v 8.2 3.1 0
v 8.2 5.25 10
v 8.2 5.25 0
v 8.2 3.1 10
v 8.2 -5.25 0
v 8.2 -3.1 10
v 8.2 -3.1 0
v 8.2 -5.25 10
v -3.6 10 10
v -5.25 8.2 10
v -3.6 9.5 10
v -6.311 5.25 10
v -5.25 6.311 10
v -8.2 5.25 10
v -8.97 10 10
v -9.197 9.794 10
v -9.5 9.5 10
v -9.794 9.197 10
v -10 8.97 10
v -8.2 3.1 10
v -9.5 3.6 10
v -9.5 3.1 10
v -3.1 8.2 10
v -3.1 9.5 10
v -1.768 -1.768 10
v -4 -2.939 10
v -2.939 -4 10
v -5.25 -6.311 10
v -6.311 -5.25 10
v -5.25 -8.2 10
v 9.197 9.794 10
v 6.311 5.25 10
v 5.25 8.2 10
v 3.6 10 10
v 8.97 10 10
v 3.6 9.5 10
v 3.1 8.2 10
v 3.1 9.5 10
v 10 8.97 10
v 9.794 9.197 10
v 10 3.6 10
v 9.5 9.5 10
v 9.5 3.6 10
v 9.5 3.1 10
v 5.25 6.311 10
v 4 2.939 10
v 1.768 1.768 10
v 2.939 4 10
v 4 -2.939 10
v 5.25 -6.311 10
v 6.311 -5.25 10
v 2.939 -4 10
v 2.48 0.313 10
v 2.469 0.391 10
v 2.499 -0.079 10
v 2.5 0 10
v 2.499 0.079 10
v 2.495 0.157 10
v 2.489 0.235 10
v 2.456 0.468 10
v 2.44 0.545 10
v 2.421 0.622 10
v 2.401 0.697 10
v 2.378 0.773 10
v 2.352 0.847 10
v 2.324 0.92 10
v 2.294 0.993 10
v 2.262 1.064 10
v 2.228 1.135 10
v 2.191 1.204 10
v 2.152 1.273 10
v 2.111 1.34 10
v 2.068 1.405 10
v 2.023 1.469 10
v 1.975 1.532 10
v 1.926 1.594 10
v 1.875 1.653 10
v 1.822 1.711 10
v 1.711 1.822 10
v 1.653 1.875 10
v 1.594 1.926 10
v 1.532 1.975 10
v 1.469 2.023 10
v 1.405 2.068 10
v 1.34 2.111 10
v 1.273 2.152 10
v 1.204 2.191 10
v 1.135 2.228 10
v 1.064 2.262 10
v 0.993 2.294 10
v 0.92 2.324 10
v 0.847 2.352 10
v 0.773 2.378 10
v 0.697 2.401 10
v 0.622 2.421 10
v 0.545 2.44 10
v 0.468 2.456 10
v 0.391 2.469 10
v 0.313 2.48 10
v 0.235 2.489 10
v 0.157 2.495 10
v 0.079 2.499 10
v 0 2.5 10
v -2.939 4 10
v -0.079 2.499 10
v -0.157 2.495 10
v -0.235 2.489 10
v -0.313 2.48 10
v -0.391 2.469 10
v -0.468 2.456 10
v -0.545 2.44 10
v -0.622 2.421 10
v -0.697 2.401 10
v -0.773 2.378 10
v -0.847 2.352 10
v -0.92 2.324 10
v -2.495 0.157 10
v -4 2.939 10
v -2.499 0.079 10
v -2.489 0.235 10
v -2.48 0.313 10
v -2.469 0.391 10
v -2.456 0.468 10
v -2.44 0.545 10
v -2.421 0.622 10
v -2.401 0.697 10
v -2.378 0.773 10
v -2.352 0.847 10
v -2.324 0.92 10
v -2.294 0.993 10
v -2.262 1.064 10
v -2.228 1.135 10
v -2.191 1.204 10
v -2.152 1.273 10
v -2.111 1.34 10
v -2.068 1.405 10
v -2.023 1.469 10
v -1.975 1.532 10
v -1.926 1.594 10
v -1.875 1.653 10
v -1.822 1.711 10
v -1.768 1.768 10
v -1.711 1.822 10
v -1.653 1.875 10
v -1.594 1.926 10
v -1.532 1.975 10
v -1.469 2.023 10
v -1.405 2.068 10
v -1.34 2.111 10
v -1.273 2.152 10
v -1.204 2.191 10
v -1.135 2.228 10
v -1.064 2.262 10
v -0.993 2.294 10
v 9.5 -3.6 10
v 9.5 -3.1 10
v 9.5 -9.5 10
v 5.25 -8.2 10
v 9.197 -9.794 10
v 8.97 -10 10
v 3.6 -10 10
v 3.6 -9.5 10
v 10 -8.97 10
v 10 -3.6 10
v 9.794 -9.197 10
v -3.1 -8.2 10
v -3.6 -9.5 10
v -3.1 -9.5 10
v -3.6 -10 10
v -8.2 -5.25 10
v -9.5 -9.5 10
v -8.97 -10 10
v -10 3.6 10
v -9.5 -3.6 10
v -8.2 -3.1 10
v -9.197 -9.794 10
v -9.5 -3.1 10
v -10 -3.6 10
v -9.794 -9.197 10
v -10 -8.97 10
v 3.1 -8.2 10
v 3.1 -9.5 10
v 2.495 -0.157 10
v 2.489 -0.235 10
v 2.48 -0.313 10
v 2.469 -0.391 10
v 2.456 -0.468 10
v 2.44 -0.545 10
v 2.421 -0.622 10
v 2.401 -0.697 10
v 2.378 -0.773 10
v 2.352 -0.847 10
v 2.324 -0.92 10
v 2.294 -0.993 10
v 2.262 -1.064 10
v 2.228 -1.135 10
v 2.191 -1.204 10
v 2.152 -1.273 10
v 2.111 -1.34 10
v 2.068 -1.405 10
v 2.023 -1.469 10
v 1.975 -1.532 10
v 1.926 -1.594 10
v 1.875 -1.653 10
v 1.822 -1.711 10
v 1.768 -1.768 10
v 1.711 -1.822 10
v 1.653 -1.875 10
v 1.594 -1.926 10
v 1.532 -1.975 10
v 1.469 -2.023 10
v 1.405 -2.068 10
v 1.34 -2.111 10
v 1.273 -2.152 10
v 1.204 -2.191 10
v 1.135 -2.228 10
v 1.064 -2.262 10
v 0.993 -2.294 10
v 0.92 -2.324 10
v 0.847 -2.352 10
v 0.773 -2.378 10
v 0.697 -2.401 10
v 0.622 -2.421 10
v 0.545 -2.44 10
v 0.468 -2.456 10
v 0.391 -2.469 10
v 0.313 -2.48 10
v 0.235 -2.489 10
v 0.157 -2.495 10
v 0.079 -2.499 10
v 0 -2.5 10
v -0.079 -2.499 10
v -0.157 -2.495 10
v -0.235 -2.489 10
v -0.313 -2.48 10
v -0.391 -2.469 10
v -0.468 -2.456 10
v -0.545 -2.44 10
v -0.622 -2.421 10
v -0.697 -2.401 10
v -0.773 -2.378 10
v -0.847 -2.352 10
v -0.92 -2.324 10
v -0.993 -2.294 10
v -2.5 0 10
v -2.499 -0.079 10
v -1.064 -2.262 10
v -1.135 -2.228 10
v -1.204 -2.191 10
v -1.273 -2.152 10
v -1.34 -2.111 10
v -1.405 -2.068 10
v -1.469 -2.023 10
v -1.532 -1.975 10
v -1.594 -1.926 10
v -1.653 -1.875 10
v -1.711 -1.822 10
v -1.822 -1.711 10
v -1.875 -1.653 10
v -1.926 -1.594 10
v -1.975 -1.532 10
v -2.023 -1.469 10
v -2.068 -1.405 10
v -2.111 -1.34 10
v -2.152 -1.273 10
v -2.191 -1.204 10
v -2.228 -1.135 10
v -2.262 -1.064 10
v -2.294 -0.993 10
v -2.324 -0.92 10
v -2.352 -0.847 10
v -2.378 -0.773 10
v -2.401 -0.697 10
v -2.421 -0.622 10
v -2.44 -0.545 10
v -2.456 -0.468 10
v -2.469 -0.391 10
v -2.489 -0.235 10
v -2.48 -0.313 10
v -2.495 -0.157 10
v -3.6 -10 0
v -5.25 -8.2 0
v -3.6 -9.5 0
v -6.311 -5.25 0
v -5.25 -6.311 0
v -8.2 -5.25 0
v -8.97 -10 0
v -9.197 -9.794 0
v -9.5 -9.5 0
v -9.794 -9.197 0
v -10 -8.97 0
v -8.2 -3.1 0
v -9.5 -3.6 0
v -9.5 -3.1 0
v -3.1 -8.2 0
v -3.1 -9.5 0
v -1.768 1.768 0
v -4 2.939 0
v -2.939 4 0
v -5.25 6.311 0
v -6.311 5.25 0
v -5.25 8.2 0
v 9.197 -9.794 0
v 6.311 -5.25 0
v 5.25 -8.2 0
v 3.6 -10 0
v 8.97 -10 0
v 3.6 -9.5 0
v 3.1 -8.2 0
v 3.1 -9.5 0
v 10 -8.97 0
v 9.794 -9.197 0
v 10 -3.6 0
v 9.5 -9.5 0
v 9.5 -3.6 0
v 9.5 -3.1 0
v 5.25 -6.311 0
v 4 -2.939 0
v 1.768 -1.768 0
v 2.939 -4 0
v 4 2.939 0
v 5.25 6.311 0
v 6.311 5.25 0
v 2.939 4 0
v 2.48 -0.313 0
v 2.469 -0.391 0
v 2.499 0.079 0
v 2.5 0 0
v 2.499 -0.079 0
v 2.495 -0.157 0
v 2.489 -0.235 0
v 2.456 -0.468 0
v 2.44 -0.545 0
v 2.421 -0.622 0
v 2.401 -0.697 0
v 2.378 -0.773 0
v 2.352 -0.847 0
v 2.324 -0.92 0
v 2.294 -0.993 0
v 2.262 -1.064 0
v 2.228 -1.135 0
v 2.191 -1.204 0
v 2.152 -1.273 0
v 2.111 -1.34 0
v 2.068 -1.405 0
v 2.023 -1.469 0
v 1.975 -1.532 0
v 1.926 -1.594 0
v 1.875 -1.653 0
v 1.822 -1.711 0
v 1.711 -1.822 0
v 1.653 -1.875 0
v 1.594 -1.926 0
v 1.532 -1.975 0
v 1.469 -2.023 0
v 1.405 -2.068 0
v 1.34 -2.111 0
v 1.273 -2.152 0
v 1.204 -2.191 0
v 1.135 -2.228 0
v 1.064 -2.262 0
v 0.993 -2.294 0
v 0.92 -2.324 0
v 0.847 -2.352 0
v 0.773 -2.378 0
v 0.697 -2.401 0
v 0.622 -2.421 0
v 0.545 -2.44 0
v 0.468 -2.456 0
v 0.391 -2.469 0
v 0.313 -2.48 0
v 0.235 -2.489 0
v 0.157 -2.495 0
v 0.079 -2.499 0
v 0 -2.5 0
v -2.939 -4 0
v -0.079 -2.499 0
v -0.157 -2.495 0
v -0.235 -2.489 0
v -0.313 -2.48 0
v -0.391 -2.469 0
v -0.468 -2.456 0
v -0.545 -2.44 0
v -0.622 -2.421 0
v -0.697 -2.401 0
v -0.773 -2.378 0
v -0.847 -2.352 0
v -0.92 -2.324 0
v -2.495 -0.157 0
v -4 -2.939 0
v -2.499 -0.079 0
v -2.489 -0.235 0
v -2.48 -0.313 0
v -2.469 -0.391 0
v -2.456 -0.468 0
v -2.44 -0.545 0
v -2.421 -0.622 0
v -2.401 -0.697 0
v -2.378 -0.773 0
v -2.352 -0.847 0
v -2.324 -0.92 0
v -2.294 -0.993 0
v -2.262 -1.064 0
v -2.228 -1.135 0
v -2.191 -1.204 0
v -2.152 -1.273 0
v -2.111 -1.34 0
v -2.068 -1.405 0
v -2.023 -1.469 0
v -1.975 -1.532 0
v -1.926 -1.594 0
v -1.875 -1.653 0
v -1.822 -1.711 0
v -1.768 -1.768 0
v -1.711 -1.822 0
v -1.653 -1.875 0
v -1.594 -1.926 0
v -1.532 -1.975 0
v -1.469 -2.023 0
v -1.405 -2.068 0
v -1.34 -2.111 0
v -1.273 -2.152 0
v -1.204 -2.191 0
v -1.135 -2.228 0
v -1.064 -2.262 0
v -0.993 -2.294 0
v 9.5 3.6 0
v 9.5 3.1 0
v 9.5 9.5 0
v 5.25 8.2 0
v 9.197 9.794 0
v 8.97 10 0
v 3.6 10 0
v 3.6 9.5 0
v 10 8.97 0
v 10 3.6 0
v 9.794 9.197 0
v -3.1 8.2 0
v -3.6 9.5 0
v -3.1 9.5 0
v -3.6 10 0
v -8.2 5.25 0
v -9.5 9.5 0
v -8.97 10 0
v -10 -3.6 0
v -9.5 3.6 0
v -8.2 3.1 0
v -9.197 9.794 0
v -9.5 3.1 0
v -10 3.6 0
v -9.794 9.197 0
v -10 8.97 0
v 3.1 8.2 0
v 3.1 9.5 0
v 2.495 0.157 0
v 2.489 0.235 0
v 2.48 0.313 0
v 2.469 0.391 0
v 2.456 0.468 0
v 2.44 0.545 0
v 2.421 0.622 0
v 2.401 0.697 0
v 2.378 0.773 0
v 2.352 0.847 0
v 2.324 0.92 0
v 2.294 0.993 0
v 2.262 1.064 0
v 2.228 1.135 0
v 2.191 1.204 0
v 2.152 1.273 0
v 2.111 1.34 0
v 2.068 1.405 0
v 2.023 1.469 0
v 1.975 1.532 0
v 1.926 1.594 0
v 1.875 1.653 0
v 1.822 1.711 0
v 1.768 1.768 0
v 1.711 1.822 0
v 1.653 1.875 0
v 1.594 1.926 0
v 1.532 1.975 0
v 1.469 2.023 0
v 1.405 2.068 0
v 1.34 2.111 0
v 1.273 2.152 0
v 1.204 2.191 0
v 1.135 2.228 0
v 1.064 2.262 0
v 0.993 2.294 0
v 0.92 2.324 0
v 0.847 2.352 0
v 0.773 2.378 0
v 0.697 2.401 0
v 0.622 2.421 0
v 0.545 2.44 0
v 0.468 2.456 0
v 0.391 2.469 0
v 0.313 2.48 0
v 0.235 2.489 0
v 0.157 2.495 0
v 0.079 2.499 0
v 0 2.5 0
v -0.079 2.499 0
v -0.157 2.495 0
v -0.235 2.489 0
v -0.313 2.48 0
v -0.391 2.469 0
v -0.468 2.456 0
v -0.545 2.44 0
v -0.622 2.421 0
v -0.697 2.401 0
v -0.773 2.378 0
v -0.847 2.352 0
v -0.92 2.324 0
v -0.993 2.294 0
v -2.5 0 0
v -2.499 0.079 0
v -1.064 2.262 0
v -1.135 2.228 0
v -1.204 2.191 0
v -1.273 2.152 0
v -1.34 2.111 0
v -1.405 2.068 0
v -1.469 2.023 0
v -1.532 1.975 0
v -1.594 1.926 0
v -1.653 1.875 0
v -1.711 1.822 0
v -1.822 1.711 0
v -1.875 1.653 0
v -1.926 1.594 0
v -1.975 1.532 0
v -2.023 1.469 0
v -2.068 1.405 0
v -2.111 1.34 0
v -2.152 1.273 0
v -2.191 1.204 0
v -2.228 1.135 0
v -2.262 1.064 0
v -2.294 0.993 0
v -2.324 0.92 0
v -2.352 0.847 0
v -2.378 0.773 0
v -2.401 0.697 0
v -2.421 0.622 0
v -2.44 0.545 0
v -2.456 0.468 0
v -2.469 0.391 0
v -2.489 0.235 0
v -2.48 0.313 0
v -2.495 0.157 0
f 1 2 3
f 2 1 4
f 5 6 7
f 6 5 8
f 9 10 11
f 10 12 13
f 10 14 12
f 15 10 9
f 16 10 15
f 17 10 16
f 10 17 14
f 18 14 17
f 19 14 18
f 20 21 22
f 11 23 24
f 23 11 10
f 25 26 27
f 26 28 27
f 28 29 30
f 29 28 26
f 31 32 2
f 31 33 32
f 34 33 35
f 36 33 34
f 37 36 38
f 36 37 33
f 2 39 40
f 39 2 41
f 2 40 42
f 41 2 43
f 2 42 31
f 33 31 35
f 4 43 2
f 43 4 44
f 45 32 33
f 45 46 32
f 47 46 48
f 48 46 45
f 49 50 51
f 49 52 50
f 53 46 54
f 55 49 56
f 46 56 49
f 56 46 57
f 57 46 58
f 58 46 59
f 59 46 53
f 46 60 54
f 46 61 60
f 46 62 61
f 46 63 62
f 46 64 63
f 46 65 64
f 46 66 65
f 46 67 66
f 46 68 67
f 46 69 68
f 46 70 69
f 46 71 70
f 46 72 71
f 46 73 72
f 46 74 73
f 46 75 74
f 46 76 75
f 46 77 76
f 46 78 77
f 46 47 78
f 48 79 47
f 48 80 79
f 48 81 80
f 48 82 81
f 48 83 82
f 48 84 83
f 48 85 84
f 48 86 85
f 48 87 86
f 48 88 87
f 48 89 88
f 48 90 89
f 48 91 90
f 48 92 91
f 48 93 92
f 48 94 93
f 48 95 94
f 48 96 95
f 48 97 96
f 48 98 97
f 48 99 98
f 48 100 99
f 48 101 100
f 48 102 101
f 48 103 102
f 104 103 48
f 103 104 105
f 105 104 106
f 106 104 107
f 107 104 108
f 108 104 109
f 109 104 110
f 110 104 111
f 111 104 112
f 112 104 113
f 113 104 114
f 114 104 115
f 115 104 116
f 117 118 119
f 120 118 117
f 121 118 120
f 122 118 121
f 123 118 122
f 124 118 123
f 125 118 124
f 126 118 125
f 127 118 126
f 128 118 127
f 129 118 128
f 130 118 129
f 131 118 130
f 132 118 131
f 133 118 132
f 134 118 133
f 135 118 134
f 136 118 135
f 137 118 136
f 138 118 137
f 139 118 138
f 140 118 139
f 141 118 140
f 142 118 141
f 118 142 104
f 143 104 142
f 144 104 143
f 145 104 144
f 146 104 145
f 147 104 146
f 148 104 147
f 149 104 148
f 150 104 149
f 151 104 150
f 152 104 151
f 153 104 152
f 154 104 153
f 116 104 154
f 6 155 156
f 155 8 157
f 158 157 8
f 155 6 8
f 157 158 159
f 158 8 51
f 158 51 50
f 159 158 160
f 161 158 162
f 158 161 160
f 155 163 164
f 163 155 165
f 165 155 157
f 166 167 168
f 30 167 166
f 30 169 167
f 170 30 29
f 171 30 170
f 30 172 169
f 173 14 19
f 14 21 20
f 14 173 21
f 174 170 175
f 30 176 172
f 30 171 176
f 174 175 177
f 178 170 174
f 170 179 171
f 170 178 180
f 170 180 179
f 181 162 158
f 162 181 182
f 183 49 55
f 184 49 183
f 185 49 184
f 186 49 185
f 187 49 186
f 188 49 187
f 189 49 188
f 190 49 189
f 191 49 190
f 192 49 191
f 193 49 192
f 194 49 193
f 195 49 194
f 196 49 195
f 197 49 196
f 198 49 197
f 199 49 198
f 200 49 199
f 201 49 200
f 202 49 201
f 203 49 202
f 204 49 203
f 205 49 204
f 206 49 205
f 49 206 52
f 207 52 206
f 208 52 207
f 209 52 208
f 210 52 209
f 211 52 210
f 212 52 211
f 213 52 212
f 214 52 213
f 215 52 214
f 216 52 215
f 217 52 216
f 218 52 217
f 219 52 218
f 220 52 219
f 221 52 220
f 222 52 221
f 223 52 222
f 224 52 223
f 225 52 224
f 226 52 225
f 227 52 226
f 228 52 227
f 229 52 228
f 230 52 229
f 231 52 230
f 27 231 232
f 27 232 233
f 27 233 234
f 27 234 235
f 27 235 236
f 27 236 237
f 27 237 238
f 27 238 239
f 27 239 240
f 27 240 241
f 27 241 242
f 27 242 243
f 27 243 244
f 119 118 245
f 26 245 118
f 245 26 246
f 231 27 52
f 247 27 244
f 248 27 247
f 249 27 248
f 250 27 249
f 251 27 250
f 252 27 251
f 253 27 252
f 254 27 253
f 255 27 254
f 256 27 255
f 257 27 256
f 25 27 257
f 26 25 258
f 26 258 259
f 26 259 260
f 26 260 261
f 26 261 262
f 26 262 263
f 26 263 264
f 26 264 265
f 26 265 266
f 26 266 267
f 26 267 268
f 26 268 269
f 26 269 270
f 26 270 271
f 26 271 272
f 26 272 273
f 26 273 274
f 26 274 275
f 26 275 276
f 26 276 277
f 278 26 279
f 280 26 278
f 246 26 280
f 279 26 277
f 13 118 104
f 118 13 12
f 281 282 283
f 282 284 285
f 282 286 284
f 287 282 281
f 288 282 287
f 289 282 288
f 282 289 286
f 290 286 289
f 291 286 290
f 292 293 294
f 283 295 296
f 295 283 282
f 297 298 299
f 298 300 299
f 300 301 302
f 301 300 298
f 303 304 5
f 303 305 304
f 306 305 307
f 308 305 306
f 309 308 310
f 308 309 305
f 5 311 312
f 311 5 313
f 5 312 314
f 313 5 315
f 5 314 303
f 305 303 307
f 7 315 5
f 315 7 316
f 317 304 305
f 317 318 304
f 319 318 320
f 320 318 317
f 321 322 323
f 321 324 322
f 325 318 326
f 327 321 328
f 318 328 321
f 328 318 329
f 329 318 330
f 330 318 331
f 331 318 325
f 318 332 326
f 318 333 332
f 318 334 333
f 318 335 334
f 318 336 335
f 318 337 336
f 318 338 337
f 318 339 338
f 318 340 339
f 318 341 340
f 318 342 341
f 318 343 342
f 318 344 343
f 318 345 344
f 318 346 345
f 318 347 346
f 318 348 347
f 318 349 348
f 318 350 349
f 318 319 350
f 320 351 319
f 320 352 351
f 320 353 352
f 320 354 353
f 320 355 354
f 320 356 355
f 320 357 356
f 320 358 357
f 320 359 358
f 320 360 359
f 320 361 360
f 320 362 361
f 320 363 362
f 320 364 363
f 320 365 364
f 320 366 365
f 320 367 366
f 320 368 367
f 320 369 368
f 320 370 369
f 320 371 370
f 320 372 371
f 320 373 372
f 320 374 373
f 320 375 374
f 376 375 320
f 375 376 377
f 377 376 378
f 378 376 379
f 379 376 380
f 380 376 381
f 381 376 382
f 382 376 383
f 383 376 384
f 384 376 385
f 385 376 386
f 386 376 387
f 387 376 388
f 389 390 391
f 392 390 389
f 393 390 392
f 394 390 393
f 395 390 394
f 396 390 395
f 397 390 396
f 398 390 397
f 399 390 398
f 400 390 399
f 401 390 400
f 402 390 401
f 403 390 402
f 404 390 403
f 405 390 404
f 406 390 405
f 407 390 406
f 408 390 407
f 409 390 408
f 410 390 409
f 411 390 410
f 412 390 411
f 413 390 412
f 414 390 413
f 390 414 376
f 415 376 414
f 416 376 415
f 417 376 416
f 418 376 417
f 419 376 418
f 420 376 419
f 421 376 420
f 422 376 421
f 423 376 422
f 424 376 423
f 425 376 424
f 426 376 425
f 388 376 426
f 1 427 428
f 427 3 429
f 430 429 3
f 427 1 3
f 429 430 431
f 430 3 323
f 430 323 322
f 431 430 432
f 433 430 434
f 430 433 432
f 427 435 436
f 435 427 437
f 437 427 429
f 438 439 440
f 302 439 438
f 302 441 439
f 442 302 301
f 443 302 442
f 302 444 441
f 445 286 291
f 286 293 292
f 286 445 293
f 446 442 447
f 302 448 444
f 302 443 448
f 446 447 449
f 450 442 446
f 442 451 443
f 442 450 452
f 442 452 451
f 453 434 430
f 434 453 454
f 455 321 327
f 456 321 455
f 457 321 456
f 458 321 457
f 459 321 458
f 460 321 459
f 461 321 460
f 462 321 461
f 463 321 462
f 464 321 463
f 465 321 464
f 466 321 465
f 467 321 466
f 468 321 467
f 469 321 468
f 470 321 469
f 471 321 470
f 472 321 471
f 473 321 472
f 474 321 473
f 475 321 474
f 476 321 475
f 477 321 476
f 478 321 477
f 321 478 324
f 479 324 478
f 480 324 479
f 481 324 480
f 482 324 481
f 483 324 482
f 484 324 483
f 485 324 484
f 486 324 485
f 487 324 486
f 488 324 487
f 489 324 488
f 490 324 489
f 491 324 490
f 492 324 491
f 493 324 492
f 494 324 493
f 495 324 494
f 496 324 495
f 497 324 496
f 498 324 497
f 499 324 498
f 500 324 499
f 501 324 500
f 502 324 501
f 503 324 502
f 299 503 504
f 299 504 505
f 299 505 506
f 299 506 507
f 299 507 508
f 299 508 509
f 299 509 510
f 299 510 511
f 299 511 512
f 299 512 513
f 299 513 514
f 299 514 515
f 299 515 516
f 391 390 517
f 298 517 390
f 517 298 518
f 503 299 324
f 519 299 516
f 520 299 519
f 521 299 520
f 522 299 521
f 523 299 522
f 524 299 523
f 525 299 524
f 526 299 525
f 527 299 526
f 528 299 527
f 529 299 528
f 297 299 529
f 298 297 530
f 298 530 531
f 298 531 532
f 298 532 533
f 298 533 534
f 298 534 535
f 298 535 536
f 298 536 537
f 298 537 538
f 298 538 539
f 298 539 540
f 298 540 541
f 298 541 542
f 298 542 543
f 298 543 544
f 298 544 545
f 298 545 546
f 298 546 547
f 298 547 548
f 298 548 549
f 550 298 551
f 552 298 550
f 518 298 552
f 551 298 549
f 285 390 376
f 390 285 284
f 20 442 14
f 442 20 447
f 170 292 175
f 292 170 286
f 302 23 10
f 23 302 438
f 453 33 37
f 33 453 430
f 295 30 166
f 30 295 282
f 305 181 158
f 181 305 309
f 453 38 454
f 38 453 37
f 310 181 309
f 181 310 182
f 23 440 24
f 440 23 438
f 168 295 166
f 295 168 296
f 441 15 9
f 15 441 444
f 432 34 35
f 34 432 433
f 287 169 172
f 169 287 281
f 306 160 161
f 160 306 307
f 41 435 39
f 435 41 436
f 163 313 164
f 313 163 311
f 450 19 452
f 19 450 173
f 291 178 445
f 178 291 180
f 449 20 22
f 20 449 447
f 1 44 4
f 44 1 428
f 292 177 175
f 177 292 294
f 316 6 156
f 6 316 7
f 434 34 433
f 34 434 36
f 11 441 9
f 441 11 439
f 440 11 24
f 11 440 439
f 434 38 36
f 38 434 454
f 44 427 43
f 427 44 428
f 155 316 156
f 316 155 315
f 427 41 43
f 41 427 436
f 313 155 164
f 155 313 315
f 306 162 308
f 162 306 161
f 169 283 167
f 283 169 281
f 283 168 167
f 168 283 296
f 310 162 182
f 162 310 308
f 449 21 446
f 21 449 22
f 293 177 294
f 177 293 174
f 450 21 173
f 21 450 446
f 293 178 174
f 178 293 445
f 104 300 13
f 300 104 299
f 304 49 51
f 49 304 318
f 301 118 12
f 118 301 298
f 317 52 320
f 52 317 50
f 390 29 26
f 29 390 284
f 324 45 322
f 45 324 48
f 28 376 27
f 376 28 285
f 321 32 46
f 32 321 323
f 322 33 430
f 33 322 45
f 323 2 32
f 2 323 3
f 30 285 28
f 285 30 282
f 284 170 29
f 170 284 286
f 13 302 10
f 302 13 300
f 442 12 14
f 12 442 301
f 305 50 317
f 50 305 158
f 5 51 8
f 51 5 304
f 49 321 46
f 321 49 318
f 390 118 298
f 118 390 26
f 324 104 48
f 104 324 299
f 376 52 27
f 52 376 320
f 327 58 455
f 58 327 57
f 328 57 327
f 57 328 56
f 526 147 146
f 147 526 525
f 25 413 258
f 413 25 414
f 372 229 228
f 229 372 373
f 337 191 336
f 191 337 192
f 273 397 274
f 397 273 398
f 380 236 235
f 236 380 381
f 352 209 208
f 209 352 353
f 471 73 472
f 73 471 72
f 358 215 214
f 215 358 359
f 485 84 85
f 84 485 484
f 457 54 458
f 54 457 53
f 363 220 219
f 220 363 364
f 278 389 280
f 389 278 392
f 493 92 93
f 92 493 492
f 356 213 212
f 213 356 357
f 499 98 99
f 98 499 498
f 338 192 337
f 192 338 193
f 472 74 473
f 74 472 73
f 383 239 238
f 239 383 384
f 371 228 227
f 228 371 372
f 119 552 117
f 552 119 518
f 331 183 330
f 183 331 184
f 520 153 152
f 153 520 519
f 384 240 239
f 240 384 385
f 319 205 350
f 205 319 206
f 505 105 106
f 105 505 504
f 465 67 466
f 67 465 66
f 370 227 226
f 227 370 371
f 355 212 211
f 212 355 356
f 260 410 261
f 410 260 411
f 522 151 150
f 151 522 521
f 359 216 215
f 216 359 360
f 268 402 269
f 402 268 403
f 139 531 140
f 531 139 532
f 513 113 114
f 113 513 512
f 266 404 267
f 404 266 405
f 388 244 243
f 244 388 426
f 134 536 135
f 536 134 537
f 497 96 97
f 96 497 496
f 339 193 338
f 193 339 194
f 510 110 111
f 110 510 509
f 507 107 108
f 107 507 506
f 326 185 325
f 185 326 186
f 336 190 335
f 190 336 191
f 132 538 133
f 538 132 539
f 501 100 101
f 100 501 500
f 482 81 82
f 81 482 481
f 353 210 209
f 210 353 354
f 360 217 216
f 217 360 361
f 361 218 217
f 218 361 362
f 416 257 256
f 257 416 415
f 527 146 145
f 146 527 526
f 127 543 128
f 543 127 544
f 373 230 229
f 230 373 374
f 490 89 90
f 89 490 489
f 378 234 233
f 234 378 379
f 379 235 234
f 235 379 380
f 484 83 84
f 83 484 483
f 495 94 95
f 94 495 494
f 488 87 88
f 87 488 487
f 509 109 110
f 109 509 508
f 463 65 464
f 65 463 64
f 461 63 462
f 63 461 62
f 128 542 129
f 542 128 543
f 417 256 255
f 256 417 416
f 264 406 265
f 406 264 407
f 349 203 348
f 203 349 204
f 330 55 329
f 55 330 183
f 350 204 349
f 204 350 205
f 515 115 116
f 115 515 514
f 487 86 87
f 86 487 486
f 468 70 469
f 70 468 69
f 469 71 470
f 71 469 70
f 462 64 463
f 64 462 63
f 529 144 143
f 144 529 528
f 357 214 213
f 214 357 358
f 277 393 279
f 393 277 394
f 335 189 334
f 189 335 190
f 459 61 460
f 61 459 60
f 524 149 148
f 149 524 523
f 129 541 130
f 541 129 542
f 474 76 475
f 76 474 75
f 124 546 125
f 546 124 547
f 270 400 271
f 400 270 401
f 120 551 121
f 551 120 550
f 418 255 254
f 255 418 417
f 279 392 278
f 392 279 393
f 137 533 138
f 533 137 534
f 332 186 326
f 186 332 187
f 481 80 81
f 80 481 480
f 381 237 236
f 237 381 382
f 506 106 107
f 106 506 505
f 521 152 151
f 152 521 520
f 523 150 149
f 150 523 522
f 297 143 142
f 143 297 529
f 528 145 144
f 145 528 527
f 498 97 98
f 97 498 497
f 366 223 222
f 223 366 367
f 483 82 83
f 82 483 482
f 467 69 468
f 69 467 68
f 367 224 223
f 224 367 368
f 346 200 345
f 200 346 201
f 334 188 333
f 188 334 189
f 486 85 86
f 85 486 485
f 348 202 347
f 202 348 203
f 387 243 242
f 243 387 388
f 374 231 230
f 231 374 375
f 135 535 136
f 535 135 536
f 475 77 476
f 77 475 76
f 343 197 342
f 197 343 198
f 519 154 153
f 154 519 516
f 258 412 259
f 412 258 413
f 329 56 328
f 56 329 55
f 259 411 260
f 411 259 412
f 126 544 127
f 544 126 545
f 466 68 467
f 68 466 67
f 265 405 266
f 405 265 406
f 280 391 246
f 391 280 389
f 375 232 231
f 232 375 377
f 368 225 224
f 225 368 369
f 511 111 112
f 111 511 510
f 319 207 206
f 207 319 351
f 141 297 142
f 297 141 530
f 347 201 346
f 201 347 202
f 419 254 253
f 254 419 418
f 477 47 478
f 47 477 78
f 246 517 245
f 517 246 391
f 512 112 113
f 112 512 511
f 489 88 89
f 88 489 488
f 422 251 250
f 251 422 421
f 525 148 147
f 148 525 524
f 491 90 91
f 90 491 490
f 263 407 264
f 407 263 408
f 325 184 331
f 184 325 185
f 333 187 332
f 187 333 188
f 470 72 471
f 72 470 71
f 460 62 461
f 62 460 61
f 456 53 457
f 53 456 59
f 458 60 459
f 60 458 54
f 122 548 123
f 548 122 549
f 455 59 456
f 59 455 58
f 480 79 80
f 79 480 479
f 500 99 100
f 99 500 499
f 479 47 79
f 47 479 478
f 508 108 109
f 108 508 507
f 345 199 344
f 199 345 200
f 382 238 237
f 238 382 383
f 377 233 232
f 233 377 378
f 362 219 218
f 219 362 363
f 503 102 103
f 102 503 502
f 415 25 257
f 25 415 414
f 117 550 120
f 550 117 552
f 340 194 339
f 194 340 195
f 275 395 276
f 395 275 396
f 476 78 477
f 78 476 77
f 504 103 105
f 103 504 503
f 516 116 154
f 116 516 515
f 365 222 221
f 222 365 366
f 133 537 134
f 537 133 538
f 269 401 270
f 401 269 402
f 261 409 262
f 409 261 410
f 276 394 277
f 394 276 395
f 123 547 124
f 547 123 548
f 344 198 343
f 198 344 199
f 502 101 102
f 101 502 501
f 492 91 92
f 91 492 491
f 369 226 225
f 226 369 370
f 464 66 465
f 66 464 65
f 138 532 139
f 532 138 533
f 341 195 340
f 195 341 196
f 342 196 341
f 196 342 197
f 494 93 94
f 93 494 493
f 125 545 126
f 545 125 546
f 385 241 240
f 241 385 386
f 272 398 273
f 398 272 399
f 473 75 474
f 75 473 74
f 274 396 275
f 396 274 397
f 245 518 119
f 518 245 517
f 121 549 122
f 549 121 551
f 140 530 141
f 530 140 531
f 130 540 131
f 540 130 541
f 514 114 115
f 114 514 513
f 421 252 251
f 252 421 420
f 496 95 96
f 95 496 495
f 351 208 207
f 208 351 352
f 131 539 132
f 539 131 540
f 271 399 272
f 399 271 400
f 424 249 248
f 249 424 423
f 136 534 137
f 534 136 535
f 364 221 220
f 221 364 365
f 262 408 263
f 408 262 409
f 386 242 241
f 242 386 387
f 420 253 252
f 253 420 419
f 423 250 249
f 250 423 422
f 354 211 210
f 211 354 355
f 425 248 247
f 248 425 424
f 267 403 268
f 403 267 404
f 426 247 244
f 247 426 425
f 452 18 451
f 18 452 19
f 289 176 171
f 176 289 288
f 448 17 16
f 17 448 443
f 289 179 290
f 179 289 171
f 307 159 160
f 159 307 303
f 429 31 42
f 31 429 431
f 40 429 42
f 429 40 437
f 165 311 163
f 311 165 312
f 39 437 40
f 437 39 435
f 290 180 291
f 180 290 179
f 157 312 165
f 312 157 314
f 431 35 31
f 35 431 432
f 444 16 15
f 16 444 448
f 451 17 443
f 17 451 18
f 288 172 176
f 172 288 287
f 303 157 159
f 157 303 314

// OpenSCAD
/* Global */

//Extrusion height
bar_height= 10;

print_part();

module print_part(){
    
    translate([0,0,bar_height/2])
    intersection(){
        cylinder(d=26.87,h=bar_height,center=true, $fn=200);
        difference(){
            union(){
                difference(){
                cube([20,20,bar_height],center=true);
                    union()    
                    {
                        cube([16.4,16.4,bar_height],center=true);
                        cube([6.2,20,bar_height],center=true);
                        cube([20,6.2,bar_height],center=true);
                        
                        translate([0,9.75,0])
                        cube([7.2,0.5,bar_height],center=true);
                        translate([9.75,0,0])
                        cube([0.5,7.2,bar_height],center=true);
                        translate([0,-9.75,0])
                        cube([7.2,0.5,bar_height],center=true);
                        translate([-9.75,0,0])
                        cube([0.5,7.2,bar_height],center=true);
                    }
                        
                }
                rotate([0,0,45]){
                    cube([1.5,26,bar_height],center=true);
                    cube([26,1.5,bar_height],center=true);
                }
                translate([7.5,7.5,0])cube([4.5,4.5,bar_height],center=true);
                translate([-7.5,-7.5,0])cube([4.5,4.5,bar_height],center=true);
                translate([-7.5,7.5,0])cube([4.5,4.5,bar_height],center=true);
                translate([7.5,-7.5,0])cube([4.5,4.5,bar_height],center=true);
                cube([8,8,bar_height],center=true);
            }
            cylinder(r=2.5,h=bar_height,center=true, $fn=200);
        }
}
}
